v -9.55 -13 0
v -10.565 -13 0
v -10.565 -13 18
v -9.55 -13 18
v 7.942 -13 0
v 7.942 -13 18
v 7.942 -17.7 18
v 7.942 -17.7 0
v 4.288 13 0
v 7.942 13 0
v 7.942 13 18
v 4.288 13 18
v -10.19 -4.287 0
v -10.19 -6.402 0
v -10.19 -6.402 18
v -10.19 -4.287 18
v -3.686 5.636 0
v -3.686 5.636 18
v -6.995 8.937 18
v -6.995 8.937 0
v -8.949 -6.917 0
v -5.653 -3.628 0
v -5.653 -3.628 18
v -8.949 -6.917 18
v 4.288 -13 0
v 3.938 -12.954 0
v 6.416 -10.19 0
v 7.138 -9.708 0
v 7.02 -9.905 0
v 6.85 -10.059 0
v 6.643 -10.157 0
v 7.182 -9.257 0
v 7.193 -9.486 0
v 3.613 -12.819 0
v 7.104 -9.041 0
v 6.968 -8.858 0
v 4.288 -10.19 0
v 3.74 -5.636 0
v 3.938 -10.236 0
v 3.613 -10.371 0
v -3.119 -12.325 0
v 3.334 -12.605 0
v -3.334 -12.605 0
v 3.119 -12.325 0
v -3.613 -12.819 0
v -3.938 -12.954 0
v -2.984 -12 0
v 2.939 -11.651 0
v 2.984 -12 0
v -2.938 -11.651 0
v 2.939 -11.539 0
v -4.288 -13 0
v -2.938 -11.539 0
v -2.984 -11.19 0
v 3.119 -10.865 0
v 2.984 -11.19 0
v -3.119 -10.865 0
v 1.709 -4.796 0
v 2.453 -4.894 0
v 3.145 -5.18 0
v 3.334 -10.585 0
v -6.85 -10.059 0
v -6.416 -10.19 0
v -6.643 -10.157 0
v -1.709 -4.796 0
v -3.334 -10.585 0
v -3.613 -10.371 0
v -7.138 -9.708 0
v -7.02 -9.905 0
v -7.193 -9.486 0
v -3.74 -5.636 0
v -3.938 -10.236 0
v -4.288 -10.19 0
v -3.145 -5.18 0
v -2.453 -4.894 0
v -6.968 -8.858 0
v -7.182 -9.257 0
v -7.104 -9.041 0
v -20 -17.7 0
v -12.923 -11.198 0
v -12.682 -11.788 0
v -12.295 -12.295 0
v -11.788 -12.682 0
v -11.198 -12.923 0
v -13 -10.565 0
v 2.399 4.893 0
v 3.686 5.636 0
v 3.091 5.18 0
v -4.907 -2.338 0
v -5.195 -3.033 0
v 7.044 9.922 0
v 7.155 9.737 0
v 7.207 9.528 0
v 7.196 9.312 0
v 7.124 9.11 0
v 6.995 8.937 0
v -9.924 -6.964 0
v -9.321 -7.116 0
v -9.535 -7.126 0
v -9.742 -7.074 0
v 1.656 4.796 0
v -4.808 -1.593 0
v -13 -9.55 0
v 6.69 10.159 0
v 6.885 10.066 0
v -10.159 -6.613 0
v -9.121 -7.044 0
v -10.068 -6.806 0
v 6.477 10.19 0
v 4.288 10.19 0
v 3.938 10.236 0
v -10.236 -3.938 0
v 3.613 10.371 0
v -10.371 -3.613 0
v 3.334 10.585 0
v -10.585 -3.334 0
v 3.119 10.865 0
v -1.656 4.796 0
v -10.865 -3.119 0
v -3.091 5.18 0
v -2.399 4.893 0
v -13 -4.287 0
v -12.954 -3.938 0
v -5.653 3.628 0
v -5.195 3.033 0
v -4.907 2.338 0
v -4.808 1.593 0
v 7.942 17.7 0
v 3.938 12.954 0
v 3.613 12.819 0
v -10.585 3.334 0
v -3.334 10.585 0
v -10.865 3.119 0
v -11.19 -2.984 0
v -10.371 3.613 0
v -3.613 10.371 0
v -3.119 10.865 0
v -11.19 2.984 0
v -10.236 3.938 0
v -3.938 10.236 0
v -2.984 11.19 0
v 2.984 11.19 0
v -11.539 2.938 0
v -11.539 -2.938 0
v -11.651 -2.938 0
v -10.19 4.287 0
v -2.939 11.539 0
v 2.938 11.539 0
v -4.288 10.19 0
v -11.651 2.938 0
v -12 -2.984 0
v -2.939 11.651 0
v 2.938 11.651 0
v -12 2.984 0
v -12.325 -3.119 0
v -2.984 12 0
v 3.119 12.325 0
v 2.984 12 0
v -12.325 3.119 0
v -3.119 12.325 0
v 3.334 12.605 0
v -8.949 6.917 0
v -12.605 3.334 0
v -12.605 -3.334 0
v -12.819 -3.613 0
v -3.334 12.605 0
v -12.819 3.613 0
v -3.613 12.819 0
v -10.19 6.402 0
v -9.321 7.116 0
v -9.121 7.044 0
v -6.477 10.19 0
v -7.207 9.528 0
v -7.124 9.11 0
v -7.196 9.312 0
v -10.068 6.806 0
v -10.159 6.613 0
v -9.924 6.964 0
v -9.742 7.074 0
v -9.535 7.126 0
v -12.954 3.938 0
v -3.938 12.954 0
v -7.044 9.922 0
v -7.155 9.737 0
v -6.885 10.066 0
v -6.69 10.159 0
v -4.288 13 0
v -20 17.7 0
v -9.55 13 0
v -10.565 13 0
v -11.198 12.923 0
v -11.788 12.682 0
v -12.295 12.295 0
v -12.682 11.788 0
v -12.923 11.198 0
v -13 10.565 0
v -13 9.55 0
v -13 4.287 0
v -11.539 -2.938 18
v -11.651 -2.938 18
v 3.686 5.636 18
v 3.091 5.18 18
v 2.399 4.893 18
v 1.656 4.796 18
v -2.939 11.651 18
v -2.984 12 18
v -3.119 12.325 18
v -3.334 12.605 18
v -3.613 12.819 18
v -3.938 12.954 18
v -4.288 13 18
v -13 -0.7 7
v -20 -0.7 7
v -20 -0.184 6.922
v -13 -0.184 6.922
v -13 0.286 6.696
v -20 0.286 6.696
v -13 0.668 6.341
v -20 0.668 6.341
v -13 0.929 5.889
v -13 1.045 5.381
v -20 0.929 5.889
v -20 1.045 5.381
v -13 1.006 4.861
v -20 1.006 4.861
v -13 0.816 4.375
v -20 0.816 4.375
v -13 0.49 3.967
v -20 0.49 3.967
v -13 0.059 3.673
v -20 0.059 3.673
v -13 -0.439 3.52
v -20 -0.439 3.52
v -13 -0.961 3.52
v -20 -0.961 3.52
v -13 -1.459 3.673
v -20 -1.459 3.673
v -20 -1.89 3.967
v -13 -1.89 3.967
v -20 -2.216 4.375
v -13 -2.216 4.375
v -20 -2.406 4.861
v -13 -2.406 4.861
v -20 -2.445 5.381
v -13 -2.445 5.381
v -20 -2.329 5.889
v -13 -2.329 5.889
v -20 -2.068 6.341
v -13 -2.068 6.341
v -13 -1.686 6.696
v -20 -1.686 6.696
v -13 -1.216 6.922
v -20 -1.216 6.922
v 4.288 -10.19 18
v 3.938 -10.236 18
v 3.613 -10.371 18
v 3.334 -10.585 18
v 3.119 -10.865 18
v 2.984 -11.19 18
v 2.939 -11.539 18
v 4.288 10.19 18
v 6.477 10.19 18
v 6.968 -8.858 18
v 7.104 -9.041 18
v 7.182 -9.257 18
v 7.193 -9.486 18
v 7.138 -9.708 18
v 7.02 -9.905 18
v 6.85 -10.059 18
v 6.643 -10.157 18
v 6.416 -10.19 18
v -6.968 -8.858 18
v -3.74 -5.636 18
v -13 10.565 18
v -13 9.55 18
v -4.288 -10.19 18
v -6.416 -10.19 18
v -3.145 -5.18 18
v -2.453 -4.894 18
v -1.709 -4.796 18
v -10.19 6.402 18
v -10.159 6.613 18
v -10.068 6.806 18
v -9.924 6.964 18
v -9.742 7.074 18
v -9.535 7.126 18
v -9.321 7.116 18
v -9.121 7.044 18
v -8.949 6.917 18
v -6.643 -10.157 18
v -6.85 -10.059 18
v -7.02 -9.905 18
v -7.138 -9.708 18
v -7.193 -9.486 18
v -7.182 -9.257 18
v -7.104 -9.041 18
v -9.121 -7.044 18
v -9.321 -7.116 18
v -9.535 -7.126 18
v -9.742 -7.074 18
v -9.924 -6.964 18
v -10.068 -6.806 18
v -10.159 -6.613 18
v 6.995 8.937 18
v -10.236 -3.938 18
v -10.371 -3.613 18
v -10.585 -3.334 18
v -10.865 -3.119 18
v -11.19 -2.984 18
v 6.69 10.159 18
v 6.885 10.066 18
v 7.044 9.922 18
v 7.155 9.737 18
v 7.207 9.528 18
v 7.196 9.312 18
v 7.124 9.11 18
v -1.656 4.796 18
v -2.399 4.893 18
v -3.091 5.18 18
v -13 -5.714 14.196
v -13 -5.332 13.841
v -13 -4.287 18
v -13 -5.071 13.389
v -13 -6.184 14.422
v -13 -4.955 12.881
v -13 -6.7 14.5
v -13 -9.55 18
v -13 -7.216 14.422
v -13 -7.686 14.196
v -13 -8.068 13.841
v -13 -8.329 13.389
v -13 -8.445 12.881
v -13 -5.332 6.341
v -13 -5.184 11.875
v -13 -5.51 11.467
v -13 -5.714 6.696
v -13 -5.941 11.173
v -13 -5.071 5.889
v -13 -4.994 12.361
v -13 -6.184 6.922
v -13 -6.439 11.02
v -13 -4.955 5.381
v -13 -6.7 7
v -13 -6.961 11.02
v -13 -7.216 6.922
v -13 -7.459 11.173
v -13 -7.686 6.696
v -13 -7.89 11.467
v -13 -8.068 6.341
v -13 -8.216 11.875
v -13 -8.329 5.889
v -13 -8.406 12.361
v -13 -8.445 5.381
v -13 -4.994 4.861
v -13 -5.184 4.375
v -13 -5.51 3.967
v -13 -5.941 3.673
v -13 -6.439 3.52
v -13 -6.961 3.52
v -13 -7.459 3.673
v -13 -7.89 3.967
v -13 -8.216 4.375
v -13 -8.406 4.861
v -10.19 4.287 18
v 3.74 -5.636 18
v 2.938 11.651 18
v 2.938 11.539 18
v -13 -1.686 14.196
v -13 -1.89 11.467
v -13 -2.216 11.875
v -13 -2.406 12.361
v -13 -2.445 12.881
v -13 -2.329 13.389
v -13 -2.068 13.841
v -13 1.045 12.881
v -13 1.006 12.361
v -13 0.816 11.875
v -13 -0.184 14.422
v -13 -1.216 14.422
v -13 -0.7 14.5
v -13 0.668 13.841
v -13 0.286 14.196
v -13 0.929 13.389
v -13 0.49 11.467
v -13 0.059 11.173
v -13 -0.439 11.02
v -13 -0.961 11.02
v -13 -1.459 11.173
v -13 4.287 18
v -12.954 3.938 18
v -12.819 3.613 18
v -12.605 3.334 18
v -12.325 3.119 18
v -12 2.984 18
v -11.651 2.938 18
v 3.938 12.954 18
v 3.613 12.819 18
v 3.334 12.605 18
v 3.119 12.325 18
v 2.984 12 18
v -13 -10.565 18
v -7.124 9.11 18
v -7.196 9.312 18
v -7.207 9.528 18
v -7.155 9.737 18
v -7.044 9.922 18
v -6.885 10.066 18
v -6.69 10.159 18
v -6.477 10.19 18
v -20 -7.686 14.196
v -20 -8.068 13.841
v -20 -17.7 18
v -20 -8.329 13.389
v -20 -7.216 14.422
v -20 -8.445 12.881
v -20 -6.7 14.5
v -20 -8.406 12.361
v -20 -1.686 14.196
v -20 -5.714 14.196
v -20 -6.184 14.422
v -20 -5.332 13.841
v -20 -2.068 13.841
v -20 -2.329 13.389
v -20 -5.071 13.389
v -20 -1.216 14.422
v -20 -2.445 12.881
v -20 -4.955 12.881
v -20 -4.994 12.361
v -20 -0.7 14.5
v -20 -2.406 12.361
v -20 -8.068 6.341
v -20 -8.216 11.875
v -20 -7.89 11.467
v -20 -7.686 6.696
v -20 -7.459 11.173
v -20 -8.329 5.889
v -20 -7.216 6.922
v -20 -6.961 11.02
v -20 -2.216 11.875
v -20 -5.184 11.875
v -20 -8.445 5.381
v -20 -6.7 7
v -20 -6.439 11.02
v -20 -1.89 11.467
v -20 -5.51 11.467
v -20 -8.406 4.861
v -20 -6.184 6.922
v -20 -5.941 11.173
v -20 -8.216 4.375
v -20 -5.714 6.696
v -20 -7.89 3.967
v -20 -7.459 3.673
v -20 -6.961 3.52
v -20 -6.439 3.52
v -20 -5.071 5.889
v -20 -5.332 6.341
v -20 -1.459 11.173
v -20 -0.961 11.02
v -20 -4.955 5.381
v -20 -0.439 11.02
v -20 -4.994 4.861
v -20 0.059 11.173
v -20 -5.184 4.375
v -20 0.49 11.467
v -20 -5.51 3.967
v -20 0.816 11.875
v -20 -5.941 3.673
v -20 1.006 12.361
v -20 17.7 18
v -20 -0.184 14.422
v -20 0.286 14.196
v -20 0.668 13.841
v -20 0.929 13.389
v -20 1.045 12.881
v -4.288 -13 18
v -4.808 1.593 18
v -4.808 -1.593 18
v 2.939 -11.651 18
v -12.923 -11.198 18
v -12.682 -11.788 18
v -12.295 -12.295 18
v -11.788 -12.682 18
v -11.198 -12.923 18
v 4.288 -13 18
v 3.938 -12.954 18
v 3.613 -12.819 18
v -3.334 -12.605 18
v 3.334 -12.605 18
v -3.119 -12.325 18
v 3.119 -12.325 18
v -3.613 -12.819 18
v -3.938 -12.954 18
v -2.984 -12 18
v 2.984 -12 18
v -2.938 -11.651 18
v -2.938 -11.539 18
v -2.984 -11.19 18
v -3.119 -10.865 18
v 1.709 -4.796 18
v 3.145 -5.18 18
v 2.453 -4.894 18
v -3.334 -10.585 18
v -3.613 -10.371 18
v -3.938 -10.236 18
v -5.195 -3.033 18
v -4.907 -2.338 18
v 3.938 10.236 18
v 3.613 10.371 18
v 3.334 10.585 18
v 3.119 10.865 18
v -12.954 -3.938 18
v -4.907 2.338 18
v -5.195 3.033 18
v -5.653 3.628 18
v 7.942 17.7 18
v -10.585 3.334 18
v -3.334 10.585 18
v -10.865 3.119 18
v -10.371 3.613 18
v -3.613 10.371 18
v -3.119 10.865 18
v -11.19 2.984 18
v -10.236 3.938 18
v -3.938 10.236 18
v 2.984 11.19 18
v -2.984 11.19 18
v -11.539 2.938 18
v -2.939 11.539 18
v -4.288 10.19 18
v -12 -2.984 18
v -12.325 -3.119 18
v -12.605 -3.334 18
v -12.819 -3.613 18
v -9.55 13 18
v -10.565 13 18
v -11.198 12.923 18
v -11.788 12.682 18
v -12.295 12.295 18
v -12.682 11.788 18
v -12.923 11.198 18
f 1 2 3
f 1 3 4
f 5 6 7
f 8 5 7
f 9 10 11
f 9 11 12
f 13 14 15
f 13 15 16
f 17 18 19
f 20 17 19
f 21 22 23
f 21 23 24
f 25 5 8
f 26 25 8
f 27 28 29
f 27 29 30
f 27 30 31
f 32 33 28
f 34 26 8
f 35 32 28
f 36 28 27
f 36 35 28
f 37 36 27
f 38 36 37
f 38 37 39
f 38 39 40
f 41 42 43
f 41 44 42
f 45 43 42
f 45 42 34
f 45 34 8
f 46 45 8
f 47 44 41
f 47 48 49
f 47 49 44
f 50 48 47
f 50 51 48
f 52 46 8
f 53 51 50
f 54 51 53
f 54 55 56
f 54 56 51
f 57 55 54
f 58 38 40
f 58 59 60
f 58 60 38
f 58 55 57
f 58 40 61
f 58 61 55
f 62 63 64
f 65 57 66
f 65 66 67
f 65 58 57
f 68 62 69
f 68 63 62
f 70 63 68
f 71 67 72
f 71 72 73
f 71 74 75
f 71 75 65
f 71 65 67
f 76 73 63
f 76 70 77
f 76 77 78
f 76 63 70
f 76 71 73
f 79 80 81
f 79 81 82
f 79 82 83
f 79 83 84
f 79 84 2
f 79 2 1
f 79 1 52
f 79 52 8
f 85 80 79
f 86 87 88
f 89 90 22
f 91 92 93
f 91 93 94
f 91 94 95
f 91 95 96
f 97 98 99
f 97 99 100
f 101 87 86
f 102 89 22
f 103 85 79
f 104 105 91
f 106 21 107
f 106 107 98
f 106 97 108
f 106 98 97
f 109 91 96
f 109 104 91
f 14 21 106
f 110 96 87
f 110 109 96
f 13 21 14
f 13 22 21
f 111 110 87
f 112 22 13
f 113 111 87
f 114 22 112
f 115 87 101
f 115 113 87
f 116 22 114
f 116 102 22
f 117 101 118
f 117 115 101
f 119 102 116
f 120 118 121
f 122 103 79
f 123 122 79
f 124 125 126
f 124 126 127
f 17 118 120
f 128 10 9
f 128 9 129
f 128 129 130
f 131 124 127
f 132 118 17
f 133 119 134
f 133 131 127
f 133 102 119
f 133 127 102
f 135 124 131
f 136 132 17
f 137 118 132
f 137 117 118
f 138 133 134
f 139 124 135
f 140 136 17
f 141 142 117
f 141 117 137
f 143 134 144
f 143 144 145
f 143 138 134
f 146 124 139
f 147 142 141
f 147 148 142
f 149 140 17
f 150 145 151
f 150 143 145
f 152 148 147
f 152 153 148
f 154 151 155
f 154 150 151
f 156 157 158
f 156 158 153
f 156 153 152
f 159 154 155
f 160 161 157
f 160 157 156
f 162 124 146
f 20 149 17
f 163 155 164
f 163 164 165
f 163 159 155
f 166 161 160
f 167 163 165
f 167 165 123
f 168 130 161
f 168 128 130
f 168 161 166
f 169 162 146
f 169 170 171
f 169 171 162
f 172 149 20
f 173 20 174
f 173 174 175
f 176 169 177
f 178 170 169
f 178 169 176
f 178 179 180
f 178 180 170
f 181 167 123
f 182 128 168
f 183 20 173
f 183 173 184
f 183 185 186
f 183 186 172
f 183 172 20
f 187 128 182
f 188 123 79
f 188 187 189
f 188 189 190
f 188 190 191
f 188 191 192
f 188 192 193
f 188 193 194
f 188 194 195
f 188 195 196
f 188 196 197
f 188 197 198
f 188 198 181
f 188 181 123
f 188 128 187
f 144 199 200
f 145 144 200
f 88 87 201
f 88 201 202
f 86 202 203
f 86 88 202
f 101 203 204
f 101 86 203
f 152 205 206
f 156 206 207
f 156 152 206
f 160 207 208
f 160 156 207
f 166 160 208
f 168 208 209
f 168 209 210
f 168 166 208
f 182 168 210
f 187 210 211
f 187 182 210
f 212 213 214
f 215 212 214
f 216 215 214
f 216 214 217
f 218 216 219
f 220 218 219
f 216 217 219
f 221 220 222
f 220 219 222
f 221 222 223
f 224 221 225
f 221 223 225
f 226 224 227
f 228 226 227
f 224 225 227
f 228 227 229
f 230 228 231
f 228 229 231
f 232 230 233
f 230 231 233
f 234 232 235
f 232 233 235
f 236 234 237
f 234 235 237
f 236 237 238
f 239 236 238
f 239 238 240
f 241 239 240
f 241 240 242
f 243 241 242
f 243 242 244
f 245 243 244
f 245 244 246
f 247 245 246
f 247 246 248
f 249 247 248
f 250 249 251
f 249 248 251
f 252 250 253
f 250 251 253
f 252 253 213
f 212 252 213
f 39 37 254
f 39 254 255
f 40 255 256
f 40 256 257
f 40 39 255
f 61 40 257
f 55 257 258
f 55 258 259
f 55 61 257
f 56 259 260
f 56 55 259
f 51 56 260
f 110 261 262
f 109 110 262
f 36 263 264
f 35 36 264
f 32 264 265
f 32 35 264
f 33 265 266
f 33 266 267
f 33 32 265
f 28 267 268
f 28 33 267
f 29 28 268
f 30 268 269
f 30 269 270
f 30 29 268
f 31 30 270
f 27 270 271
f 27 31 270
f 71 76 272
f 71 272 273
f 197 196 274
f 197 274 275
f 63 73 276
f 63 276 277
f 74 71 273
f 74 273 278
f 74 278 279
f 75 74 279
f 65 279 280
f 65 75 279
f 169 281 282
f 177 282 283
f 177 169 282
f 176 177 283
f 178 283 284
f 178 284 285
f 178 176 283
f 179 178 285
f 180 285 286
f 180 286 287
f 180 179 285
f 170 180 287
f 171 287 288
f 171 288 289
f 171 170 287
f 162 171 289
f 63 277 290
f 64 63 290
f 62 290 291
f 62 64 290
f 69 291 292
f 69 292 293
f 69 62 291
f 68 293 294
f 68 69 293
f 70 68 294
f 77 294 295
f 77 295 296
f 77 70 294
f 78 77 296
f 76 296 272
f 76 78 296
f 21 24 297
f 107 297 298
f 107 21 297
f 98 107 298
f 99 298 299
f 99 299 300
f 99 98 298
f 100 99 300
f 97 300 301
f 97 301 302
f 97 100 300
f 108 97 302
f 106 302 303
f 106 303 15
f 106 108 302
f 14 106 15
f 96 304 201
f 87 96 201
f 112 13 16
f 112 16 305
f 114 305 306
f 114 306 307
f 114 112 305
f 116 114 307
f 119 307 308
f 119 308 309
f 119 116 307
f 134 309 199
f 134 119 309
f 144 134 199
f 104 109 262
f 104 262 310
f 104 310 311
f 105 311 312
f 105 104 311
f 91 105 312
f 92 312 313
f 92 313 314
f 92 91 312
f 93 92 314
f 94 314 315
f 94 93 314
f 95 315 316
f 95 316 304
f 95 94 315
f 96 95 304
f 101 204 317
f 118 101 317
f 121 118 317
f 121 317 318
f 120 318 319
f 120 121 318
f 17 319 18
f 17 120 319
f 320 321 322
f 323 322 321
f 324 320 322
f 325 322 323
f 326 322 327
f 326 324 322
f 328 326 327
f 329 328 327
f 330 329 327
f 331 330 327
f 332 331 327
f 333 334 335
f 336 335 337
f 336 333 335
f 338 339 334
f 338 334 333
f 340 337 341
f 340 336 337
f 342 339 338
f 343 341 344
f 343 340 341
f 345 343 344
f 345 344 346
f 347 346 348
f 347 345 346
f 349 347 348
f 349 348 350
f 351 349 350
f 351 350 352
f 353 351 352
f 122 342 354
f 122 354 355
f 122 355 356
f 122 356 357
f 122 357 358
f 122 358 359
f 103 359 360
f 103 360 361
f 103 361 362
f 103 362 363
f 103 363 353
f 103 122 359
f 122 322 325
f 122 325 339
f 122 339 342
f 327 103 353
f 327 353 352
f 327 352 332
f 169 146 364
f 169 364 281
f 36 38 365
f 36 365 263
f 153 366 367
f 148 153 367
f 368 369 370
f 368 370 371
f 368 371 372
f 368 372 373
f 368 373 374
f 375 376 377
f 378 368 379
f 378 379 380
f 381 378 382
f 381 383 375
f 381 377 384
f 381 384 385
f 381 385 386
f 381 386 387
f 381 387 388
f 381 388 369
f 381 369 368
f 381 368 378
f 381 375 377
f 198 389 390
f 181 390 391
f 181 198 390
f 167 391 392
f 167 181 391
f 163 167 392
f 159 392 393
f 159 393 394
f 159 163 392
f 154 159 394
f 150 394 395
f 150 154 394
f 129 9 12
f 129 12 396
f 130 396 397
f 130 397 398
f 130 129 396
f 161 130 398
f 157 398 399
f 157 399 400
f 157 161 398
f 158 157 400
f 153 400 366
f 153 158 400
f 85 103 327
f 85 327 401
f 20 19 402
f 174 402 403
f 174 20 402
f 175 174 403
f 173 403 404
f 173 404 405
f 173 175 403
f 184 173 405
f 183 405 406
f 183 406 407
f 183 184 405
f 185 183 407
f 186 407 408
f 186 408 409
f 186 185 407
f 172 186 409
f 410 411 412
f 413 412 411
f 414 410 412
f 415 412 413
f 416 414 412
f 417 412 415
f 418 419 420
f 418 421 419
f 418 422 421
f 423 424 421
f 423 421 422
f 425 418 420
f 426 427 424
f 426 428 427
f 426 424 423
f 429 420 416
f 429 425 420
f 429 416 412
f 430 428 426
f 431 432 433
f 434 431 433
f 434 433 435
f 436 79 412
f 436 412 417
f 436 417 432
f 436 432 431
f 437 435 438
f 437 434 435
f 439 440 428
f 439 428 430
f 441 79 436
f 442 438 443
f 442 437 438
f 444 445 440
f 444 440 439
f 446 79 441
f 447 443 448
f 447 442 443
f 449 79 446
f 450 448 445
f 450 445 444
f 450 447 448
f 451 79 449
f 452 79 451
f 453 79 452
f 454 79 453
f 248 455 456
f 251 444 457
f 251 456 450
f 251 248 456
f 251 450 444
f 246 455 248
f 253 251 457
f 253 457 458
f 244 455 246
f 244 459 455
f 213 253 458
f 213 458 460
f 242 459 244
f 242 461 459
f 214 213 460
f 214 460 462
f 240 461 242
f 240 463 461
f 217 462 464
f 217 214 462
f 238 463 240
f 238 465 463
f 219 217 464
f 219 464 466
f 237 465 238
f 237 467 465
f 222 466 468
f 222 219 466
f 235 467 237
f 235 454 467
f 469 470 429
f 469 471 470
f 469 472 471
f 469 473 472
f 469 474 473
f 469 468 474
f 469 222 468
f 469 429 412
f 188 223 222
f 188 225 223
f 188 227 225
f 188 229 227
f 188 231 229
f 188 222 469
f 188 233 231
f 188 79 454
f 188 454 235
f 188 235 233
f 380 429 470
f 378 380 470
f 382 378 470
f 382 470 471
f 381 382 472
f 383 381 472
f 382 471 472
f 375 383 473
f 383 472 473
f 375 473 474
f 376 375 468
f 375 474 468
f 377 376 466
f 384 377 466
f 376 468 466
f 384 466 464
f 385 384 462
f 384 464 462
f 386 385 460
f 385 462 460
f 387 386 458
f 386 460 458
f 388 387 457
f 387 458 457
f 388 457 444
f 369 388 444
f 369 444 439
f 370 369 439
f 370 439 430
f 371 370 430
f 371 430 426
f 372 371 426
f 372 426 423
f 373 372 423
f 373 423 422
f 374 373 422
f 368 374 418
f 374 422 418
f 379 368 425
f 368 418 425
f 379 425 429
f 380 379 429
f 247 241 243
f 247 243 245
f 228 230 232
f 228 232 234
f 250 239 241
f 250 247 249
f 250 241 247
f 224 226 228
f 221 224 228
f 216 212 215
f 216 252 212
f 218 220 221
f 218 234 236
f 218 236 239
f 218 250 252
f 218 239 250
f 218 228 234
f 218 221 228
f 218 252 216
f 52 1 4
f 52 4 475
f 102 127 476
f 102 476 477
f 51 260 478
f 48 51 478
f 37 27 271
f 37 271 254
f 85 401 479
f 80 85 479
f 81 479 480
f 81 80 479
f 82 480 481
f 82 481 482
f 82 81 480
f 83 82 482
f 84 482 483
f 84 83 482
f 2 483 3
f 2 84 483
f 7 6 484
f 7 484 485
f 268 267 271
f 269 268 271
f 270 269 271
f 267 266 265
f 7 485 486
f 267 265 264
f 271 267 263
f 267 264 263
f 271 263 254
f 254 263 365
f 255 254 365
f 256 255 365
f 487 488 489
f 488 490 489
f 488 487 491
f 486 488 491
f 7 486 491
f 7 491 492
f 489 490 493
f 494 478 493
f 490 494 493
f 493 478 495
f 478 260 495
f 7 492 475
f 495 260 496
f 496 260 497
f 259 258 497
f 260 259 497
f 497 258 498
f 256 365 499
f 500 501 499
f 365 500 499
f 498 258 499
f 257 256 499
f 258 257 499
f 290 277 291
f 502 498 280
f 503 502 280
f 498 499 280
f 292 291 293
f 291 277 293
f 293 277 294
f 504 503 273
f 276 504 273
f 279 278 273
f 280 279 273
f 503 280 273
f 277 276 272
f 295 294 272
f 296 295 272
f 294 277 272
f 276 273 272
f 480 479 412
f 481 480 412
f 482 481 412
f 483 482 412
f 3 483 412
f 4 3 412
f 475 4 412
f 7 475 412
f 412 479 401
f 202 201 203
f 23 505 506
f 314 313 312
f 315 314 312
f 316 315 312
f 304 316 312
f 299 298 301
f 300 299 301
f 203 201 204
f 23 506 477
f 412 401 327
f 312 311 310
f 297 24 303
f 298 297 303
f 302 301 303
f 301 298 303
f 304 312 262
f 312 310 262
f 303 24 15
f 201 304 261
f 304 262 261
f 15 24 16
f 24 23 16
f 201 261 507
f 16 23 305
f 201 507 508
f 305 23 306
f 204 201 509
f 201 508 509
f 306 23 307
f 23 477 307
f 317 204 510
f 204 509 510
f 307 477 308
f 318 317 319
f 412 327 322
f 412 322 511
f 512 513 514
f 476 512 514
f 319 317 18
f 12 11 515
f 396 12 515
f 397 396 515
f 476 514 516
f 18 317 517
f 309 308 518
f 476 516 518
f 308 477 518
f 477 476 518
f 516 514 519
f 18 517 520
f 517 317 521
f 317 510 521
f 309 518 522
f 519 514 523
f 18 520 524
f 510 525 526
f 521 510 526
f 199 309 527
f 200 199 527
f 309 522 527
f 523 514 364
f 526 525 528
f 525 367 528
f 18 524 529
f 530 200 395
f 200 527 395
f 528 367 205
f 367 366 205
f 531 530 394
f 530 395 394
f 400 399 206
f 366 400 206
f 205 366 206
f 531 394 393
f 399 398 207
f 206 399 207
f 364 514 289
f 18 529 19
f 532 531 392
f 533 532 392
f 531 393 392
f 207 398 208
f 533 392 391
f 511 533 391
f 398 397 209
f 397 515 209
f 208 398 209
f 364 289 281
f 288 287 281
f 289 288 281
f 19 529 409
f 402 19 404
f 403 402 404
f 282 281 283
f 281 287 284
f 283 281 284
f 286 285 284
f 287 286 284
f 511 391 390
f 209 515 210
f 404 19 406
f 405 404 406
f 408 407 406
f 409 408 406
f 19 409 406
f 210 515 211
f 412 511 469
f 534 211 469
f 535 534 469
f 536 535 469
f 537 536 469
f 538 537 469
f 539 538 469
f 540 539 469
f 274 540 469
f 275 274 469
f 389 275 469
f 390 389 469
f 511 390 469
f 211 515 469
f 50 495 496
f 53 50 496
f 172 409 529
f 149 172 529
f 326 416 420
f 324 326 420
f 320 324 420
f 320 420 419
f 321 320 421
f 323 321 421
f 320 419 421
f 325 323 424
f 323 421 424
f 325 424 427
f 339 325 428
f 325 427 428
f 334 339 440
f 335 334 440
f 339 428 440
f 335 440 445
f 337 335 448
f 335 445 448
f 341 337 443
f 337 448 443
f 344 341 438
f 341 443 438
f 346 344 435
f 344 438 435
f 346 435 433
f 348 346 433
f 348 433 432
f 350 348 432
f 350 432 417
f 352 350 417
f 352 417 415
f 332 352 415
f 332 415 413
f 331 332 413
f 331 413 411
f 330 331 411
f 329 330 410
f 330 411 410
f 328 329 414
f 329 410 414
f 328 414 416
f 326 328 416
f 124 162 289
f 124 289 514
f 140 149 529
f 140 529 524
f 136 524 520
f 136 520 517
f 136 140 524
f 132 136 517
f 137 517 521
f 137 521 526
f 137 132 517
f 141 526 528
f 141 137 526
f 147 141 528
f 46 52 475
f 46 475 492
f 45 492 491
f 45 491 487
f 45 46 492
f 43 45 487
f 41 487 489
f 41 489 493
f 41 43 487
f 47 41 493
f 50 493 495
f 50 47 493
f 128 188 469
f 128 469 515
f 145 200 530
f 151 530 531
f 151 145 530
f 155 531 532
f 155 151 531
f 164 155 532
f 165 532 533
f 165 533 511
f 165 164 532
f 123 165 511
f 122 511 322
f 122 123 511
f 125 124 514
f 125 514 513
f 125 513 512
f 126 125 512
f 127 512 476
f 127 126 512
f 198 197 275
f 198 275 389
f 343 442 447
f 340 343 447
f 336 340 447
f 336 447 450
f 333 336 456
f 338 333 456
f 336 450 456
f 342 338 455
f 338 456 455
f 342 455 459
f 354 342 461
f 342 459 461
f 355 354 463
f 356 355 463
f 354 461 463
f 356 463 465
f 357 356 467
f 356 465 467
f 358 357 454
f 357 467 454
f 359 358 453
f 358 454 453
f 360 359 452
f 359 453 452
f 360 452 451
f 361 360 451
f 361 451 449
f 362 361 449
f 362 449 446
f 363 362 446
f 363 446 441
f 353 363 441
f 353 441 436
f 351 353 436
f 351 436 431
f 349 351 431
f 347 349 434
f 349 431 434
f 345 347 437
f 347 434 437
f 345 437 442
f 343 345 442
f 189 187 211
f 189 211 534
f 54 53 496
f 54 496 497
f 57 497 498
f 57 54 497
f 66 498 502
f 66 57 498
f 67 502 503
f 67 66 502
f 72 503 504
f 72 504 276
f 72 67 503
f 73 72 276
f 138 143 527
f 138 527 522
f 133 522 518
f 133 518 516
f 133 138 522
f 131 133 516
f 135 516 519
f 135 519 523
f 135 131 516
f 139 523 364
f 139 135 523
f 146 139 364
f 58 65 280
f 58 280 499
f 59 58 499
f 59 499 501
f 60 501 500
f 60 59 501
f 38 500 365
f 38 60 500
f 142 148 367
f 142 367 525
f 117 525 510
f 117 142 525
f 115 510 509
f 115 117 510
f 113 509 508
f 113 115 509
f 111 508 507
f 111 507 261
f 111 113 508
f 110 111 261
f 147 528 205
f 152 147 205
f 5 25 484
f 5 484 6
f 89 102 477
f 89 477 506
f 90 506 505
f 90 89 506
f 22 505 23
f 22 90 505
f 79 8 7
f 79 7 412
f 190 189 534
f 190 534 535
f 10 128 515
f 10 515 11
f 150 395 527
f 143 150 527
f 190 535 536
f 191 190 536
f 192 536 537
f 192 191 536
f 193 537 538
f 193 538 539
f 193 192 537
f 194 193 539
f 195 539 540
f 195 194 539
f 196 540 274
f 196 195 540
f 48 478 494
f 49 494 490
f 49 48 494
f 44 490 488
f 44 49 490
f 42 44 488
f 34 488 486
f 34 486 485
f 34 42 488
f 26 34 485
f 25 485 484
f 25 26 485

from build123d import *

# Parameters (mm, degrees)
BOSS_EXTRUDE1_DEPTH = 18
SKETCH2_R           = 1.75
CUT_EXTRUDE1_DEPTH  = 7


with BuildPart() as part:
    # Sketch1 → Boss-Extrude1 (new body)
    with BuildSketch(Plane.XY):
        with BuildLine():
            Line((7.941784918, -13), (7.941784918, -17.7))
            Line((7.941784918, -17.7), (-20, -17.7))
            Line((-20, -17.7), (-20, 17.699847501))
            Line((-20, 17.699847501), (7.941784918, 17.699847501))
            Line((7.941784918, 17.699847501), (7.941784918, 13))
            Line((7.941784918, 13), (6.333126718, 13))
            Line((6.333126718, 13), (5.317126718, 13))
            Line((5.317126718, 13), (4.287512407, 13))
            ThreePointArc((4.287512407, 13), (3.333616586, 12.604883414), (2.9385, 11.650987593))
            Line((2.9385, 11.650987593), (2.9385, 11.539212407))
            ThreePointArc((2.9385, 11.539212407), (3.333616586, 10.585316586), (4.287512407, 10.1902))
            Line((4.287512407, 10.1902), (6.476788598, 10.1902))
            ThreePointArc((6.476788598, 10.1902), (7.154992901, 9.736757749), (6.995146796, 8.93674514))
            Line((6.995146796, 8.93674514), (3.686383353, 5.635543623))
            ThreePointArc((3.686383353, 5.635543623), (2.754473742, 5.014017446), (1.655778399, 4.7958))
            Line((1.655778399, 4.7958), (-1.655778399, 4.7958))
            ThreePointArc((-1.655778399, 4.7958), (-2.754473742, 5.014017446), (-3.686383353, 5.635543623))
            Line((-3.686383353, 5.635543623), (-6.995146796, 8.93674514))
            ThreePointArc((-6.995146796, 8.93674514), (-7.154992901, 9.736757749), (-6.476788598, 10.1902))
            Line((-6.476788598, 10.1902), (-4.287512407, 10.1902))
            ThreePointArc((-4.287512407, 10.1902), (-3.333616586, 10.585316586), (-2.9385, 11.539212407))
            Line((-2.9385, 11.539212407), (-2.9385, 11.650987593))
            ThreePointArc((-2.9385, 11.650987593), (-3.333616586, 12.604883414), (-4.287512407, 13))
            Line((-4.287512407, 13), (-5.317126718, 13))
            Line((-5.317126718, 13), (-6.333126718, 13))
            Line((-6.333126718, 13), (-9.550465633, 13))
            Line((-9.550465633, 13), (-10.564722121, 12.999847763))
            ThreePointArc((-10.564722121, 12.999847763), (-12.294654751, 12.29465435), (-12.999847757, 10.564721553))
            Line((-12.999847757, 10.564721553), (-13, 9.550422515))
            Line((-13, 9.550422515), (-13, 5.3170836))
            Line((-13, 5.3170836), (-13, 4.287469289))
            ThreePointArc((-13, 4.287469289), (-12.604883414, 3.333573468), (-11.650987593, 2.938456882))
            Line((-11.650987593, 2.938456882), (-11.539212407, 2.938456882))
            ThreePointArc((-11.539212407, 2.938456882), (-10.585316586, 3.333573468), (-10.1902, 4.287469289))
            Line((-10.1902, 4.287469289), (-10.1902, 6.402089023))
            ThreePointArc((-10.1902, 6.402089023), (-9.74154152, 7.073969797), (-8.94902056, 6.917034355))
            Line((-8.94902056, 6.917034355), (-5.652895046, 3.628441884))
            ThreePointArc((-5.652895046, 3.628441884), (-5.027976112, 2.694919539), (-4.8085, 1.593185507))
            Line((-4.8085, 1.593185507), (-4.8085, -1.593185507))
            ThreePointArc((-4.8085, -1.593185507), (-5.027976112, -2.694919539), (-5.652895046, -3.628441884))
            Line((-5.652895046, -3.628441884), (-8.94902056, -6.917034355))
            ThreePointArc((-8.94902056, -6.917034355), (-9.74154152, -7.073969797), (-10.1902, -6.402089023))
            Line((-10.1902, -6.402089023), (-10.1902, -4.287469289))
            ThreePointArc((-10.1902, -4.287469289), (-10.585316586, -3.333573468), (-11.539212407, -2.938456882))
            Line((-11.539212407, -2.938456882), (-11.650987593, -2.938456882))
            ThreePointArc((-11.650987593, -2.938456882), (-12.604883414, -3.333573468), (-13, -4.287469289))
            Line((-13, -4.287469289), (-13, -5.3170836))
            Line((-13, -5.3170836), (-13, -6.3330836))
            Line((-13, -6.3330836), (-13, -9.550422515))
            Line((-13, -9.550422515), (-12.999847757, -10.564721553))
            ThreePointArc((-12.999847757, -10.564721553), (-12.294654751, -12.29465435), (-10.564722121, -12.999847763))
            Line((-10.564722121, -12.999847763), (-9.550465633, -13))
            Line((-9.550465633, -13), (-6.333126718, -13))
            Line((-6.333126718, -13), (-5.317126718, -13))
            Line((-5.317126718, -13), (-4.287512407, -13))
            ThreePointArc((-4.287512407, -13), (-3.333616586, -12.604883414), (-2.9385, -11.650987593))
            Line((-2.9385, -11.650987593), (-2.9385, -11.539212407))
            ThreePointArc((-2.9385, -11.539212407), (-3.333616586, -10.585316586), (-4.287512407, -10.1902))
            Line((-4.287512407, -10.1902), (-6.416408329, -10.1902))
            ThreePointArc((-6.416408329, -10.1902), (-7.137514675, -9.708134418), (-6.967711912, -8.857517813))
            Line((-6.967711912, -8.857517813), (-3.740331666, -5.636015806))
            ThreePointArc((-3.740331666, -5.636015806), (-2.808257752, -5.01414519), (-1.709253557, -4.7958))
            Line((-1.709253557, -4.7958), (1.709253557, -4.7958))
            ThreePointArc((1.709253557, -4.7958), (2.808257752, -5.01414519), (3.740331666, -5.636015806))
            Line((3.740331666, -5.636015806), (6.967711912, -8.857517813))
            ThreePointArc((6.967711912, -8.857517813), (7.137514675, -9.708134418), (6.416408329, -10.1902))
            Line((6.416408329, -10.1902), (4.287512407, -10.1902))
            ThreePointArc((4.287512407, -10.1902), (3.333616586, -10.585316586), (2.9385, -11.539212407))
            Line((2.9385, -11.539212407), (2.9385, -11.650987593))
            ThreePointArc((2.9385, -11.650987593), (3.333616586, -12.604883414), (4.287512407, -13))
            Line((4.287512407, -13), (5.317126718, -13))
            Line((5.317126718, -13), (6.333126718, -13))
            Line((6.333126718, -13), (7.941784918, -13))
        make_face()
    extrude(amount=BOSS_EXTRUDE1_DEPTH)

    # Sketch2 → Cut-Extrude1 (cut)
    with BuildSketch(Plane.ZY.offset(20)):
        with Locations((5.25, -0.7)):
            Circle(SKETCH2_R)
        with Locations((12.75, -0.7)):
            Circle(SKETCH2_R)
        with Locations((5.25, -6.7)):
            Circle(SKETCH2_R)
        with Locations((12.75, -6.7)):
            Circle(SKETCH2_R)
    extrude(amount=-CUT_EXTRUDE1_DEPTH, mode=Mode.SUBTRACT)


solid = part.part
